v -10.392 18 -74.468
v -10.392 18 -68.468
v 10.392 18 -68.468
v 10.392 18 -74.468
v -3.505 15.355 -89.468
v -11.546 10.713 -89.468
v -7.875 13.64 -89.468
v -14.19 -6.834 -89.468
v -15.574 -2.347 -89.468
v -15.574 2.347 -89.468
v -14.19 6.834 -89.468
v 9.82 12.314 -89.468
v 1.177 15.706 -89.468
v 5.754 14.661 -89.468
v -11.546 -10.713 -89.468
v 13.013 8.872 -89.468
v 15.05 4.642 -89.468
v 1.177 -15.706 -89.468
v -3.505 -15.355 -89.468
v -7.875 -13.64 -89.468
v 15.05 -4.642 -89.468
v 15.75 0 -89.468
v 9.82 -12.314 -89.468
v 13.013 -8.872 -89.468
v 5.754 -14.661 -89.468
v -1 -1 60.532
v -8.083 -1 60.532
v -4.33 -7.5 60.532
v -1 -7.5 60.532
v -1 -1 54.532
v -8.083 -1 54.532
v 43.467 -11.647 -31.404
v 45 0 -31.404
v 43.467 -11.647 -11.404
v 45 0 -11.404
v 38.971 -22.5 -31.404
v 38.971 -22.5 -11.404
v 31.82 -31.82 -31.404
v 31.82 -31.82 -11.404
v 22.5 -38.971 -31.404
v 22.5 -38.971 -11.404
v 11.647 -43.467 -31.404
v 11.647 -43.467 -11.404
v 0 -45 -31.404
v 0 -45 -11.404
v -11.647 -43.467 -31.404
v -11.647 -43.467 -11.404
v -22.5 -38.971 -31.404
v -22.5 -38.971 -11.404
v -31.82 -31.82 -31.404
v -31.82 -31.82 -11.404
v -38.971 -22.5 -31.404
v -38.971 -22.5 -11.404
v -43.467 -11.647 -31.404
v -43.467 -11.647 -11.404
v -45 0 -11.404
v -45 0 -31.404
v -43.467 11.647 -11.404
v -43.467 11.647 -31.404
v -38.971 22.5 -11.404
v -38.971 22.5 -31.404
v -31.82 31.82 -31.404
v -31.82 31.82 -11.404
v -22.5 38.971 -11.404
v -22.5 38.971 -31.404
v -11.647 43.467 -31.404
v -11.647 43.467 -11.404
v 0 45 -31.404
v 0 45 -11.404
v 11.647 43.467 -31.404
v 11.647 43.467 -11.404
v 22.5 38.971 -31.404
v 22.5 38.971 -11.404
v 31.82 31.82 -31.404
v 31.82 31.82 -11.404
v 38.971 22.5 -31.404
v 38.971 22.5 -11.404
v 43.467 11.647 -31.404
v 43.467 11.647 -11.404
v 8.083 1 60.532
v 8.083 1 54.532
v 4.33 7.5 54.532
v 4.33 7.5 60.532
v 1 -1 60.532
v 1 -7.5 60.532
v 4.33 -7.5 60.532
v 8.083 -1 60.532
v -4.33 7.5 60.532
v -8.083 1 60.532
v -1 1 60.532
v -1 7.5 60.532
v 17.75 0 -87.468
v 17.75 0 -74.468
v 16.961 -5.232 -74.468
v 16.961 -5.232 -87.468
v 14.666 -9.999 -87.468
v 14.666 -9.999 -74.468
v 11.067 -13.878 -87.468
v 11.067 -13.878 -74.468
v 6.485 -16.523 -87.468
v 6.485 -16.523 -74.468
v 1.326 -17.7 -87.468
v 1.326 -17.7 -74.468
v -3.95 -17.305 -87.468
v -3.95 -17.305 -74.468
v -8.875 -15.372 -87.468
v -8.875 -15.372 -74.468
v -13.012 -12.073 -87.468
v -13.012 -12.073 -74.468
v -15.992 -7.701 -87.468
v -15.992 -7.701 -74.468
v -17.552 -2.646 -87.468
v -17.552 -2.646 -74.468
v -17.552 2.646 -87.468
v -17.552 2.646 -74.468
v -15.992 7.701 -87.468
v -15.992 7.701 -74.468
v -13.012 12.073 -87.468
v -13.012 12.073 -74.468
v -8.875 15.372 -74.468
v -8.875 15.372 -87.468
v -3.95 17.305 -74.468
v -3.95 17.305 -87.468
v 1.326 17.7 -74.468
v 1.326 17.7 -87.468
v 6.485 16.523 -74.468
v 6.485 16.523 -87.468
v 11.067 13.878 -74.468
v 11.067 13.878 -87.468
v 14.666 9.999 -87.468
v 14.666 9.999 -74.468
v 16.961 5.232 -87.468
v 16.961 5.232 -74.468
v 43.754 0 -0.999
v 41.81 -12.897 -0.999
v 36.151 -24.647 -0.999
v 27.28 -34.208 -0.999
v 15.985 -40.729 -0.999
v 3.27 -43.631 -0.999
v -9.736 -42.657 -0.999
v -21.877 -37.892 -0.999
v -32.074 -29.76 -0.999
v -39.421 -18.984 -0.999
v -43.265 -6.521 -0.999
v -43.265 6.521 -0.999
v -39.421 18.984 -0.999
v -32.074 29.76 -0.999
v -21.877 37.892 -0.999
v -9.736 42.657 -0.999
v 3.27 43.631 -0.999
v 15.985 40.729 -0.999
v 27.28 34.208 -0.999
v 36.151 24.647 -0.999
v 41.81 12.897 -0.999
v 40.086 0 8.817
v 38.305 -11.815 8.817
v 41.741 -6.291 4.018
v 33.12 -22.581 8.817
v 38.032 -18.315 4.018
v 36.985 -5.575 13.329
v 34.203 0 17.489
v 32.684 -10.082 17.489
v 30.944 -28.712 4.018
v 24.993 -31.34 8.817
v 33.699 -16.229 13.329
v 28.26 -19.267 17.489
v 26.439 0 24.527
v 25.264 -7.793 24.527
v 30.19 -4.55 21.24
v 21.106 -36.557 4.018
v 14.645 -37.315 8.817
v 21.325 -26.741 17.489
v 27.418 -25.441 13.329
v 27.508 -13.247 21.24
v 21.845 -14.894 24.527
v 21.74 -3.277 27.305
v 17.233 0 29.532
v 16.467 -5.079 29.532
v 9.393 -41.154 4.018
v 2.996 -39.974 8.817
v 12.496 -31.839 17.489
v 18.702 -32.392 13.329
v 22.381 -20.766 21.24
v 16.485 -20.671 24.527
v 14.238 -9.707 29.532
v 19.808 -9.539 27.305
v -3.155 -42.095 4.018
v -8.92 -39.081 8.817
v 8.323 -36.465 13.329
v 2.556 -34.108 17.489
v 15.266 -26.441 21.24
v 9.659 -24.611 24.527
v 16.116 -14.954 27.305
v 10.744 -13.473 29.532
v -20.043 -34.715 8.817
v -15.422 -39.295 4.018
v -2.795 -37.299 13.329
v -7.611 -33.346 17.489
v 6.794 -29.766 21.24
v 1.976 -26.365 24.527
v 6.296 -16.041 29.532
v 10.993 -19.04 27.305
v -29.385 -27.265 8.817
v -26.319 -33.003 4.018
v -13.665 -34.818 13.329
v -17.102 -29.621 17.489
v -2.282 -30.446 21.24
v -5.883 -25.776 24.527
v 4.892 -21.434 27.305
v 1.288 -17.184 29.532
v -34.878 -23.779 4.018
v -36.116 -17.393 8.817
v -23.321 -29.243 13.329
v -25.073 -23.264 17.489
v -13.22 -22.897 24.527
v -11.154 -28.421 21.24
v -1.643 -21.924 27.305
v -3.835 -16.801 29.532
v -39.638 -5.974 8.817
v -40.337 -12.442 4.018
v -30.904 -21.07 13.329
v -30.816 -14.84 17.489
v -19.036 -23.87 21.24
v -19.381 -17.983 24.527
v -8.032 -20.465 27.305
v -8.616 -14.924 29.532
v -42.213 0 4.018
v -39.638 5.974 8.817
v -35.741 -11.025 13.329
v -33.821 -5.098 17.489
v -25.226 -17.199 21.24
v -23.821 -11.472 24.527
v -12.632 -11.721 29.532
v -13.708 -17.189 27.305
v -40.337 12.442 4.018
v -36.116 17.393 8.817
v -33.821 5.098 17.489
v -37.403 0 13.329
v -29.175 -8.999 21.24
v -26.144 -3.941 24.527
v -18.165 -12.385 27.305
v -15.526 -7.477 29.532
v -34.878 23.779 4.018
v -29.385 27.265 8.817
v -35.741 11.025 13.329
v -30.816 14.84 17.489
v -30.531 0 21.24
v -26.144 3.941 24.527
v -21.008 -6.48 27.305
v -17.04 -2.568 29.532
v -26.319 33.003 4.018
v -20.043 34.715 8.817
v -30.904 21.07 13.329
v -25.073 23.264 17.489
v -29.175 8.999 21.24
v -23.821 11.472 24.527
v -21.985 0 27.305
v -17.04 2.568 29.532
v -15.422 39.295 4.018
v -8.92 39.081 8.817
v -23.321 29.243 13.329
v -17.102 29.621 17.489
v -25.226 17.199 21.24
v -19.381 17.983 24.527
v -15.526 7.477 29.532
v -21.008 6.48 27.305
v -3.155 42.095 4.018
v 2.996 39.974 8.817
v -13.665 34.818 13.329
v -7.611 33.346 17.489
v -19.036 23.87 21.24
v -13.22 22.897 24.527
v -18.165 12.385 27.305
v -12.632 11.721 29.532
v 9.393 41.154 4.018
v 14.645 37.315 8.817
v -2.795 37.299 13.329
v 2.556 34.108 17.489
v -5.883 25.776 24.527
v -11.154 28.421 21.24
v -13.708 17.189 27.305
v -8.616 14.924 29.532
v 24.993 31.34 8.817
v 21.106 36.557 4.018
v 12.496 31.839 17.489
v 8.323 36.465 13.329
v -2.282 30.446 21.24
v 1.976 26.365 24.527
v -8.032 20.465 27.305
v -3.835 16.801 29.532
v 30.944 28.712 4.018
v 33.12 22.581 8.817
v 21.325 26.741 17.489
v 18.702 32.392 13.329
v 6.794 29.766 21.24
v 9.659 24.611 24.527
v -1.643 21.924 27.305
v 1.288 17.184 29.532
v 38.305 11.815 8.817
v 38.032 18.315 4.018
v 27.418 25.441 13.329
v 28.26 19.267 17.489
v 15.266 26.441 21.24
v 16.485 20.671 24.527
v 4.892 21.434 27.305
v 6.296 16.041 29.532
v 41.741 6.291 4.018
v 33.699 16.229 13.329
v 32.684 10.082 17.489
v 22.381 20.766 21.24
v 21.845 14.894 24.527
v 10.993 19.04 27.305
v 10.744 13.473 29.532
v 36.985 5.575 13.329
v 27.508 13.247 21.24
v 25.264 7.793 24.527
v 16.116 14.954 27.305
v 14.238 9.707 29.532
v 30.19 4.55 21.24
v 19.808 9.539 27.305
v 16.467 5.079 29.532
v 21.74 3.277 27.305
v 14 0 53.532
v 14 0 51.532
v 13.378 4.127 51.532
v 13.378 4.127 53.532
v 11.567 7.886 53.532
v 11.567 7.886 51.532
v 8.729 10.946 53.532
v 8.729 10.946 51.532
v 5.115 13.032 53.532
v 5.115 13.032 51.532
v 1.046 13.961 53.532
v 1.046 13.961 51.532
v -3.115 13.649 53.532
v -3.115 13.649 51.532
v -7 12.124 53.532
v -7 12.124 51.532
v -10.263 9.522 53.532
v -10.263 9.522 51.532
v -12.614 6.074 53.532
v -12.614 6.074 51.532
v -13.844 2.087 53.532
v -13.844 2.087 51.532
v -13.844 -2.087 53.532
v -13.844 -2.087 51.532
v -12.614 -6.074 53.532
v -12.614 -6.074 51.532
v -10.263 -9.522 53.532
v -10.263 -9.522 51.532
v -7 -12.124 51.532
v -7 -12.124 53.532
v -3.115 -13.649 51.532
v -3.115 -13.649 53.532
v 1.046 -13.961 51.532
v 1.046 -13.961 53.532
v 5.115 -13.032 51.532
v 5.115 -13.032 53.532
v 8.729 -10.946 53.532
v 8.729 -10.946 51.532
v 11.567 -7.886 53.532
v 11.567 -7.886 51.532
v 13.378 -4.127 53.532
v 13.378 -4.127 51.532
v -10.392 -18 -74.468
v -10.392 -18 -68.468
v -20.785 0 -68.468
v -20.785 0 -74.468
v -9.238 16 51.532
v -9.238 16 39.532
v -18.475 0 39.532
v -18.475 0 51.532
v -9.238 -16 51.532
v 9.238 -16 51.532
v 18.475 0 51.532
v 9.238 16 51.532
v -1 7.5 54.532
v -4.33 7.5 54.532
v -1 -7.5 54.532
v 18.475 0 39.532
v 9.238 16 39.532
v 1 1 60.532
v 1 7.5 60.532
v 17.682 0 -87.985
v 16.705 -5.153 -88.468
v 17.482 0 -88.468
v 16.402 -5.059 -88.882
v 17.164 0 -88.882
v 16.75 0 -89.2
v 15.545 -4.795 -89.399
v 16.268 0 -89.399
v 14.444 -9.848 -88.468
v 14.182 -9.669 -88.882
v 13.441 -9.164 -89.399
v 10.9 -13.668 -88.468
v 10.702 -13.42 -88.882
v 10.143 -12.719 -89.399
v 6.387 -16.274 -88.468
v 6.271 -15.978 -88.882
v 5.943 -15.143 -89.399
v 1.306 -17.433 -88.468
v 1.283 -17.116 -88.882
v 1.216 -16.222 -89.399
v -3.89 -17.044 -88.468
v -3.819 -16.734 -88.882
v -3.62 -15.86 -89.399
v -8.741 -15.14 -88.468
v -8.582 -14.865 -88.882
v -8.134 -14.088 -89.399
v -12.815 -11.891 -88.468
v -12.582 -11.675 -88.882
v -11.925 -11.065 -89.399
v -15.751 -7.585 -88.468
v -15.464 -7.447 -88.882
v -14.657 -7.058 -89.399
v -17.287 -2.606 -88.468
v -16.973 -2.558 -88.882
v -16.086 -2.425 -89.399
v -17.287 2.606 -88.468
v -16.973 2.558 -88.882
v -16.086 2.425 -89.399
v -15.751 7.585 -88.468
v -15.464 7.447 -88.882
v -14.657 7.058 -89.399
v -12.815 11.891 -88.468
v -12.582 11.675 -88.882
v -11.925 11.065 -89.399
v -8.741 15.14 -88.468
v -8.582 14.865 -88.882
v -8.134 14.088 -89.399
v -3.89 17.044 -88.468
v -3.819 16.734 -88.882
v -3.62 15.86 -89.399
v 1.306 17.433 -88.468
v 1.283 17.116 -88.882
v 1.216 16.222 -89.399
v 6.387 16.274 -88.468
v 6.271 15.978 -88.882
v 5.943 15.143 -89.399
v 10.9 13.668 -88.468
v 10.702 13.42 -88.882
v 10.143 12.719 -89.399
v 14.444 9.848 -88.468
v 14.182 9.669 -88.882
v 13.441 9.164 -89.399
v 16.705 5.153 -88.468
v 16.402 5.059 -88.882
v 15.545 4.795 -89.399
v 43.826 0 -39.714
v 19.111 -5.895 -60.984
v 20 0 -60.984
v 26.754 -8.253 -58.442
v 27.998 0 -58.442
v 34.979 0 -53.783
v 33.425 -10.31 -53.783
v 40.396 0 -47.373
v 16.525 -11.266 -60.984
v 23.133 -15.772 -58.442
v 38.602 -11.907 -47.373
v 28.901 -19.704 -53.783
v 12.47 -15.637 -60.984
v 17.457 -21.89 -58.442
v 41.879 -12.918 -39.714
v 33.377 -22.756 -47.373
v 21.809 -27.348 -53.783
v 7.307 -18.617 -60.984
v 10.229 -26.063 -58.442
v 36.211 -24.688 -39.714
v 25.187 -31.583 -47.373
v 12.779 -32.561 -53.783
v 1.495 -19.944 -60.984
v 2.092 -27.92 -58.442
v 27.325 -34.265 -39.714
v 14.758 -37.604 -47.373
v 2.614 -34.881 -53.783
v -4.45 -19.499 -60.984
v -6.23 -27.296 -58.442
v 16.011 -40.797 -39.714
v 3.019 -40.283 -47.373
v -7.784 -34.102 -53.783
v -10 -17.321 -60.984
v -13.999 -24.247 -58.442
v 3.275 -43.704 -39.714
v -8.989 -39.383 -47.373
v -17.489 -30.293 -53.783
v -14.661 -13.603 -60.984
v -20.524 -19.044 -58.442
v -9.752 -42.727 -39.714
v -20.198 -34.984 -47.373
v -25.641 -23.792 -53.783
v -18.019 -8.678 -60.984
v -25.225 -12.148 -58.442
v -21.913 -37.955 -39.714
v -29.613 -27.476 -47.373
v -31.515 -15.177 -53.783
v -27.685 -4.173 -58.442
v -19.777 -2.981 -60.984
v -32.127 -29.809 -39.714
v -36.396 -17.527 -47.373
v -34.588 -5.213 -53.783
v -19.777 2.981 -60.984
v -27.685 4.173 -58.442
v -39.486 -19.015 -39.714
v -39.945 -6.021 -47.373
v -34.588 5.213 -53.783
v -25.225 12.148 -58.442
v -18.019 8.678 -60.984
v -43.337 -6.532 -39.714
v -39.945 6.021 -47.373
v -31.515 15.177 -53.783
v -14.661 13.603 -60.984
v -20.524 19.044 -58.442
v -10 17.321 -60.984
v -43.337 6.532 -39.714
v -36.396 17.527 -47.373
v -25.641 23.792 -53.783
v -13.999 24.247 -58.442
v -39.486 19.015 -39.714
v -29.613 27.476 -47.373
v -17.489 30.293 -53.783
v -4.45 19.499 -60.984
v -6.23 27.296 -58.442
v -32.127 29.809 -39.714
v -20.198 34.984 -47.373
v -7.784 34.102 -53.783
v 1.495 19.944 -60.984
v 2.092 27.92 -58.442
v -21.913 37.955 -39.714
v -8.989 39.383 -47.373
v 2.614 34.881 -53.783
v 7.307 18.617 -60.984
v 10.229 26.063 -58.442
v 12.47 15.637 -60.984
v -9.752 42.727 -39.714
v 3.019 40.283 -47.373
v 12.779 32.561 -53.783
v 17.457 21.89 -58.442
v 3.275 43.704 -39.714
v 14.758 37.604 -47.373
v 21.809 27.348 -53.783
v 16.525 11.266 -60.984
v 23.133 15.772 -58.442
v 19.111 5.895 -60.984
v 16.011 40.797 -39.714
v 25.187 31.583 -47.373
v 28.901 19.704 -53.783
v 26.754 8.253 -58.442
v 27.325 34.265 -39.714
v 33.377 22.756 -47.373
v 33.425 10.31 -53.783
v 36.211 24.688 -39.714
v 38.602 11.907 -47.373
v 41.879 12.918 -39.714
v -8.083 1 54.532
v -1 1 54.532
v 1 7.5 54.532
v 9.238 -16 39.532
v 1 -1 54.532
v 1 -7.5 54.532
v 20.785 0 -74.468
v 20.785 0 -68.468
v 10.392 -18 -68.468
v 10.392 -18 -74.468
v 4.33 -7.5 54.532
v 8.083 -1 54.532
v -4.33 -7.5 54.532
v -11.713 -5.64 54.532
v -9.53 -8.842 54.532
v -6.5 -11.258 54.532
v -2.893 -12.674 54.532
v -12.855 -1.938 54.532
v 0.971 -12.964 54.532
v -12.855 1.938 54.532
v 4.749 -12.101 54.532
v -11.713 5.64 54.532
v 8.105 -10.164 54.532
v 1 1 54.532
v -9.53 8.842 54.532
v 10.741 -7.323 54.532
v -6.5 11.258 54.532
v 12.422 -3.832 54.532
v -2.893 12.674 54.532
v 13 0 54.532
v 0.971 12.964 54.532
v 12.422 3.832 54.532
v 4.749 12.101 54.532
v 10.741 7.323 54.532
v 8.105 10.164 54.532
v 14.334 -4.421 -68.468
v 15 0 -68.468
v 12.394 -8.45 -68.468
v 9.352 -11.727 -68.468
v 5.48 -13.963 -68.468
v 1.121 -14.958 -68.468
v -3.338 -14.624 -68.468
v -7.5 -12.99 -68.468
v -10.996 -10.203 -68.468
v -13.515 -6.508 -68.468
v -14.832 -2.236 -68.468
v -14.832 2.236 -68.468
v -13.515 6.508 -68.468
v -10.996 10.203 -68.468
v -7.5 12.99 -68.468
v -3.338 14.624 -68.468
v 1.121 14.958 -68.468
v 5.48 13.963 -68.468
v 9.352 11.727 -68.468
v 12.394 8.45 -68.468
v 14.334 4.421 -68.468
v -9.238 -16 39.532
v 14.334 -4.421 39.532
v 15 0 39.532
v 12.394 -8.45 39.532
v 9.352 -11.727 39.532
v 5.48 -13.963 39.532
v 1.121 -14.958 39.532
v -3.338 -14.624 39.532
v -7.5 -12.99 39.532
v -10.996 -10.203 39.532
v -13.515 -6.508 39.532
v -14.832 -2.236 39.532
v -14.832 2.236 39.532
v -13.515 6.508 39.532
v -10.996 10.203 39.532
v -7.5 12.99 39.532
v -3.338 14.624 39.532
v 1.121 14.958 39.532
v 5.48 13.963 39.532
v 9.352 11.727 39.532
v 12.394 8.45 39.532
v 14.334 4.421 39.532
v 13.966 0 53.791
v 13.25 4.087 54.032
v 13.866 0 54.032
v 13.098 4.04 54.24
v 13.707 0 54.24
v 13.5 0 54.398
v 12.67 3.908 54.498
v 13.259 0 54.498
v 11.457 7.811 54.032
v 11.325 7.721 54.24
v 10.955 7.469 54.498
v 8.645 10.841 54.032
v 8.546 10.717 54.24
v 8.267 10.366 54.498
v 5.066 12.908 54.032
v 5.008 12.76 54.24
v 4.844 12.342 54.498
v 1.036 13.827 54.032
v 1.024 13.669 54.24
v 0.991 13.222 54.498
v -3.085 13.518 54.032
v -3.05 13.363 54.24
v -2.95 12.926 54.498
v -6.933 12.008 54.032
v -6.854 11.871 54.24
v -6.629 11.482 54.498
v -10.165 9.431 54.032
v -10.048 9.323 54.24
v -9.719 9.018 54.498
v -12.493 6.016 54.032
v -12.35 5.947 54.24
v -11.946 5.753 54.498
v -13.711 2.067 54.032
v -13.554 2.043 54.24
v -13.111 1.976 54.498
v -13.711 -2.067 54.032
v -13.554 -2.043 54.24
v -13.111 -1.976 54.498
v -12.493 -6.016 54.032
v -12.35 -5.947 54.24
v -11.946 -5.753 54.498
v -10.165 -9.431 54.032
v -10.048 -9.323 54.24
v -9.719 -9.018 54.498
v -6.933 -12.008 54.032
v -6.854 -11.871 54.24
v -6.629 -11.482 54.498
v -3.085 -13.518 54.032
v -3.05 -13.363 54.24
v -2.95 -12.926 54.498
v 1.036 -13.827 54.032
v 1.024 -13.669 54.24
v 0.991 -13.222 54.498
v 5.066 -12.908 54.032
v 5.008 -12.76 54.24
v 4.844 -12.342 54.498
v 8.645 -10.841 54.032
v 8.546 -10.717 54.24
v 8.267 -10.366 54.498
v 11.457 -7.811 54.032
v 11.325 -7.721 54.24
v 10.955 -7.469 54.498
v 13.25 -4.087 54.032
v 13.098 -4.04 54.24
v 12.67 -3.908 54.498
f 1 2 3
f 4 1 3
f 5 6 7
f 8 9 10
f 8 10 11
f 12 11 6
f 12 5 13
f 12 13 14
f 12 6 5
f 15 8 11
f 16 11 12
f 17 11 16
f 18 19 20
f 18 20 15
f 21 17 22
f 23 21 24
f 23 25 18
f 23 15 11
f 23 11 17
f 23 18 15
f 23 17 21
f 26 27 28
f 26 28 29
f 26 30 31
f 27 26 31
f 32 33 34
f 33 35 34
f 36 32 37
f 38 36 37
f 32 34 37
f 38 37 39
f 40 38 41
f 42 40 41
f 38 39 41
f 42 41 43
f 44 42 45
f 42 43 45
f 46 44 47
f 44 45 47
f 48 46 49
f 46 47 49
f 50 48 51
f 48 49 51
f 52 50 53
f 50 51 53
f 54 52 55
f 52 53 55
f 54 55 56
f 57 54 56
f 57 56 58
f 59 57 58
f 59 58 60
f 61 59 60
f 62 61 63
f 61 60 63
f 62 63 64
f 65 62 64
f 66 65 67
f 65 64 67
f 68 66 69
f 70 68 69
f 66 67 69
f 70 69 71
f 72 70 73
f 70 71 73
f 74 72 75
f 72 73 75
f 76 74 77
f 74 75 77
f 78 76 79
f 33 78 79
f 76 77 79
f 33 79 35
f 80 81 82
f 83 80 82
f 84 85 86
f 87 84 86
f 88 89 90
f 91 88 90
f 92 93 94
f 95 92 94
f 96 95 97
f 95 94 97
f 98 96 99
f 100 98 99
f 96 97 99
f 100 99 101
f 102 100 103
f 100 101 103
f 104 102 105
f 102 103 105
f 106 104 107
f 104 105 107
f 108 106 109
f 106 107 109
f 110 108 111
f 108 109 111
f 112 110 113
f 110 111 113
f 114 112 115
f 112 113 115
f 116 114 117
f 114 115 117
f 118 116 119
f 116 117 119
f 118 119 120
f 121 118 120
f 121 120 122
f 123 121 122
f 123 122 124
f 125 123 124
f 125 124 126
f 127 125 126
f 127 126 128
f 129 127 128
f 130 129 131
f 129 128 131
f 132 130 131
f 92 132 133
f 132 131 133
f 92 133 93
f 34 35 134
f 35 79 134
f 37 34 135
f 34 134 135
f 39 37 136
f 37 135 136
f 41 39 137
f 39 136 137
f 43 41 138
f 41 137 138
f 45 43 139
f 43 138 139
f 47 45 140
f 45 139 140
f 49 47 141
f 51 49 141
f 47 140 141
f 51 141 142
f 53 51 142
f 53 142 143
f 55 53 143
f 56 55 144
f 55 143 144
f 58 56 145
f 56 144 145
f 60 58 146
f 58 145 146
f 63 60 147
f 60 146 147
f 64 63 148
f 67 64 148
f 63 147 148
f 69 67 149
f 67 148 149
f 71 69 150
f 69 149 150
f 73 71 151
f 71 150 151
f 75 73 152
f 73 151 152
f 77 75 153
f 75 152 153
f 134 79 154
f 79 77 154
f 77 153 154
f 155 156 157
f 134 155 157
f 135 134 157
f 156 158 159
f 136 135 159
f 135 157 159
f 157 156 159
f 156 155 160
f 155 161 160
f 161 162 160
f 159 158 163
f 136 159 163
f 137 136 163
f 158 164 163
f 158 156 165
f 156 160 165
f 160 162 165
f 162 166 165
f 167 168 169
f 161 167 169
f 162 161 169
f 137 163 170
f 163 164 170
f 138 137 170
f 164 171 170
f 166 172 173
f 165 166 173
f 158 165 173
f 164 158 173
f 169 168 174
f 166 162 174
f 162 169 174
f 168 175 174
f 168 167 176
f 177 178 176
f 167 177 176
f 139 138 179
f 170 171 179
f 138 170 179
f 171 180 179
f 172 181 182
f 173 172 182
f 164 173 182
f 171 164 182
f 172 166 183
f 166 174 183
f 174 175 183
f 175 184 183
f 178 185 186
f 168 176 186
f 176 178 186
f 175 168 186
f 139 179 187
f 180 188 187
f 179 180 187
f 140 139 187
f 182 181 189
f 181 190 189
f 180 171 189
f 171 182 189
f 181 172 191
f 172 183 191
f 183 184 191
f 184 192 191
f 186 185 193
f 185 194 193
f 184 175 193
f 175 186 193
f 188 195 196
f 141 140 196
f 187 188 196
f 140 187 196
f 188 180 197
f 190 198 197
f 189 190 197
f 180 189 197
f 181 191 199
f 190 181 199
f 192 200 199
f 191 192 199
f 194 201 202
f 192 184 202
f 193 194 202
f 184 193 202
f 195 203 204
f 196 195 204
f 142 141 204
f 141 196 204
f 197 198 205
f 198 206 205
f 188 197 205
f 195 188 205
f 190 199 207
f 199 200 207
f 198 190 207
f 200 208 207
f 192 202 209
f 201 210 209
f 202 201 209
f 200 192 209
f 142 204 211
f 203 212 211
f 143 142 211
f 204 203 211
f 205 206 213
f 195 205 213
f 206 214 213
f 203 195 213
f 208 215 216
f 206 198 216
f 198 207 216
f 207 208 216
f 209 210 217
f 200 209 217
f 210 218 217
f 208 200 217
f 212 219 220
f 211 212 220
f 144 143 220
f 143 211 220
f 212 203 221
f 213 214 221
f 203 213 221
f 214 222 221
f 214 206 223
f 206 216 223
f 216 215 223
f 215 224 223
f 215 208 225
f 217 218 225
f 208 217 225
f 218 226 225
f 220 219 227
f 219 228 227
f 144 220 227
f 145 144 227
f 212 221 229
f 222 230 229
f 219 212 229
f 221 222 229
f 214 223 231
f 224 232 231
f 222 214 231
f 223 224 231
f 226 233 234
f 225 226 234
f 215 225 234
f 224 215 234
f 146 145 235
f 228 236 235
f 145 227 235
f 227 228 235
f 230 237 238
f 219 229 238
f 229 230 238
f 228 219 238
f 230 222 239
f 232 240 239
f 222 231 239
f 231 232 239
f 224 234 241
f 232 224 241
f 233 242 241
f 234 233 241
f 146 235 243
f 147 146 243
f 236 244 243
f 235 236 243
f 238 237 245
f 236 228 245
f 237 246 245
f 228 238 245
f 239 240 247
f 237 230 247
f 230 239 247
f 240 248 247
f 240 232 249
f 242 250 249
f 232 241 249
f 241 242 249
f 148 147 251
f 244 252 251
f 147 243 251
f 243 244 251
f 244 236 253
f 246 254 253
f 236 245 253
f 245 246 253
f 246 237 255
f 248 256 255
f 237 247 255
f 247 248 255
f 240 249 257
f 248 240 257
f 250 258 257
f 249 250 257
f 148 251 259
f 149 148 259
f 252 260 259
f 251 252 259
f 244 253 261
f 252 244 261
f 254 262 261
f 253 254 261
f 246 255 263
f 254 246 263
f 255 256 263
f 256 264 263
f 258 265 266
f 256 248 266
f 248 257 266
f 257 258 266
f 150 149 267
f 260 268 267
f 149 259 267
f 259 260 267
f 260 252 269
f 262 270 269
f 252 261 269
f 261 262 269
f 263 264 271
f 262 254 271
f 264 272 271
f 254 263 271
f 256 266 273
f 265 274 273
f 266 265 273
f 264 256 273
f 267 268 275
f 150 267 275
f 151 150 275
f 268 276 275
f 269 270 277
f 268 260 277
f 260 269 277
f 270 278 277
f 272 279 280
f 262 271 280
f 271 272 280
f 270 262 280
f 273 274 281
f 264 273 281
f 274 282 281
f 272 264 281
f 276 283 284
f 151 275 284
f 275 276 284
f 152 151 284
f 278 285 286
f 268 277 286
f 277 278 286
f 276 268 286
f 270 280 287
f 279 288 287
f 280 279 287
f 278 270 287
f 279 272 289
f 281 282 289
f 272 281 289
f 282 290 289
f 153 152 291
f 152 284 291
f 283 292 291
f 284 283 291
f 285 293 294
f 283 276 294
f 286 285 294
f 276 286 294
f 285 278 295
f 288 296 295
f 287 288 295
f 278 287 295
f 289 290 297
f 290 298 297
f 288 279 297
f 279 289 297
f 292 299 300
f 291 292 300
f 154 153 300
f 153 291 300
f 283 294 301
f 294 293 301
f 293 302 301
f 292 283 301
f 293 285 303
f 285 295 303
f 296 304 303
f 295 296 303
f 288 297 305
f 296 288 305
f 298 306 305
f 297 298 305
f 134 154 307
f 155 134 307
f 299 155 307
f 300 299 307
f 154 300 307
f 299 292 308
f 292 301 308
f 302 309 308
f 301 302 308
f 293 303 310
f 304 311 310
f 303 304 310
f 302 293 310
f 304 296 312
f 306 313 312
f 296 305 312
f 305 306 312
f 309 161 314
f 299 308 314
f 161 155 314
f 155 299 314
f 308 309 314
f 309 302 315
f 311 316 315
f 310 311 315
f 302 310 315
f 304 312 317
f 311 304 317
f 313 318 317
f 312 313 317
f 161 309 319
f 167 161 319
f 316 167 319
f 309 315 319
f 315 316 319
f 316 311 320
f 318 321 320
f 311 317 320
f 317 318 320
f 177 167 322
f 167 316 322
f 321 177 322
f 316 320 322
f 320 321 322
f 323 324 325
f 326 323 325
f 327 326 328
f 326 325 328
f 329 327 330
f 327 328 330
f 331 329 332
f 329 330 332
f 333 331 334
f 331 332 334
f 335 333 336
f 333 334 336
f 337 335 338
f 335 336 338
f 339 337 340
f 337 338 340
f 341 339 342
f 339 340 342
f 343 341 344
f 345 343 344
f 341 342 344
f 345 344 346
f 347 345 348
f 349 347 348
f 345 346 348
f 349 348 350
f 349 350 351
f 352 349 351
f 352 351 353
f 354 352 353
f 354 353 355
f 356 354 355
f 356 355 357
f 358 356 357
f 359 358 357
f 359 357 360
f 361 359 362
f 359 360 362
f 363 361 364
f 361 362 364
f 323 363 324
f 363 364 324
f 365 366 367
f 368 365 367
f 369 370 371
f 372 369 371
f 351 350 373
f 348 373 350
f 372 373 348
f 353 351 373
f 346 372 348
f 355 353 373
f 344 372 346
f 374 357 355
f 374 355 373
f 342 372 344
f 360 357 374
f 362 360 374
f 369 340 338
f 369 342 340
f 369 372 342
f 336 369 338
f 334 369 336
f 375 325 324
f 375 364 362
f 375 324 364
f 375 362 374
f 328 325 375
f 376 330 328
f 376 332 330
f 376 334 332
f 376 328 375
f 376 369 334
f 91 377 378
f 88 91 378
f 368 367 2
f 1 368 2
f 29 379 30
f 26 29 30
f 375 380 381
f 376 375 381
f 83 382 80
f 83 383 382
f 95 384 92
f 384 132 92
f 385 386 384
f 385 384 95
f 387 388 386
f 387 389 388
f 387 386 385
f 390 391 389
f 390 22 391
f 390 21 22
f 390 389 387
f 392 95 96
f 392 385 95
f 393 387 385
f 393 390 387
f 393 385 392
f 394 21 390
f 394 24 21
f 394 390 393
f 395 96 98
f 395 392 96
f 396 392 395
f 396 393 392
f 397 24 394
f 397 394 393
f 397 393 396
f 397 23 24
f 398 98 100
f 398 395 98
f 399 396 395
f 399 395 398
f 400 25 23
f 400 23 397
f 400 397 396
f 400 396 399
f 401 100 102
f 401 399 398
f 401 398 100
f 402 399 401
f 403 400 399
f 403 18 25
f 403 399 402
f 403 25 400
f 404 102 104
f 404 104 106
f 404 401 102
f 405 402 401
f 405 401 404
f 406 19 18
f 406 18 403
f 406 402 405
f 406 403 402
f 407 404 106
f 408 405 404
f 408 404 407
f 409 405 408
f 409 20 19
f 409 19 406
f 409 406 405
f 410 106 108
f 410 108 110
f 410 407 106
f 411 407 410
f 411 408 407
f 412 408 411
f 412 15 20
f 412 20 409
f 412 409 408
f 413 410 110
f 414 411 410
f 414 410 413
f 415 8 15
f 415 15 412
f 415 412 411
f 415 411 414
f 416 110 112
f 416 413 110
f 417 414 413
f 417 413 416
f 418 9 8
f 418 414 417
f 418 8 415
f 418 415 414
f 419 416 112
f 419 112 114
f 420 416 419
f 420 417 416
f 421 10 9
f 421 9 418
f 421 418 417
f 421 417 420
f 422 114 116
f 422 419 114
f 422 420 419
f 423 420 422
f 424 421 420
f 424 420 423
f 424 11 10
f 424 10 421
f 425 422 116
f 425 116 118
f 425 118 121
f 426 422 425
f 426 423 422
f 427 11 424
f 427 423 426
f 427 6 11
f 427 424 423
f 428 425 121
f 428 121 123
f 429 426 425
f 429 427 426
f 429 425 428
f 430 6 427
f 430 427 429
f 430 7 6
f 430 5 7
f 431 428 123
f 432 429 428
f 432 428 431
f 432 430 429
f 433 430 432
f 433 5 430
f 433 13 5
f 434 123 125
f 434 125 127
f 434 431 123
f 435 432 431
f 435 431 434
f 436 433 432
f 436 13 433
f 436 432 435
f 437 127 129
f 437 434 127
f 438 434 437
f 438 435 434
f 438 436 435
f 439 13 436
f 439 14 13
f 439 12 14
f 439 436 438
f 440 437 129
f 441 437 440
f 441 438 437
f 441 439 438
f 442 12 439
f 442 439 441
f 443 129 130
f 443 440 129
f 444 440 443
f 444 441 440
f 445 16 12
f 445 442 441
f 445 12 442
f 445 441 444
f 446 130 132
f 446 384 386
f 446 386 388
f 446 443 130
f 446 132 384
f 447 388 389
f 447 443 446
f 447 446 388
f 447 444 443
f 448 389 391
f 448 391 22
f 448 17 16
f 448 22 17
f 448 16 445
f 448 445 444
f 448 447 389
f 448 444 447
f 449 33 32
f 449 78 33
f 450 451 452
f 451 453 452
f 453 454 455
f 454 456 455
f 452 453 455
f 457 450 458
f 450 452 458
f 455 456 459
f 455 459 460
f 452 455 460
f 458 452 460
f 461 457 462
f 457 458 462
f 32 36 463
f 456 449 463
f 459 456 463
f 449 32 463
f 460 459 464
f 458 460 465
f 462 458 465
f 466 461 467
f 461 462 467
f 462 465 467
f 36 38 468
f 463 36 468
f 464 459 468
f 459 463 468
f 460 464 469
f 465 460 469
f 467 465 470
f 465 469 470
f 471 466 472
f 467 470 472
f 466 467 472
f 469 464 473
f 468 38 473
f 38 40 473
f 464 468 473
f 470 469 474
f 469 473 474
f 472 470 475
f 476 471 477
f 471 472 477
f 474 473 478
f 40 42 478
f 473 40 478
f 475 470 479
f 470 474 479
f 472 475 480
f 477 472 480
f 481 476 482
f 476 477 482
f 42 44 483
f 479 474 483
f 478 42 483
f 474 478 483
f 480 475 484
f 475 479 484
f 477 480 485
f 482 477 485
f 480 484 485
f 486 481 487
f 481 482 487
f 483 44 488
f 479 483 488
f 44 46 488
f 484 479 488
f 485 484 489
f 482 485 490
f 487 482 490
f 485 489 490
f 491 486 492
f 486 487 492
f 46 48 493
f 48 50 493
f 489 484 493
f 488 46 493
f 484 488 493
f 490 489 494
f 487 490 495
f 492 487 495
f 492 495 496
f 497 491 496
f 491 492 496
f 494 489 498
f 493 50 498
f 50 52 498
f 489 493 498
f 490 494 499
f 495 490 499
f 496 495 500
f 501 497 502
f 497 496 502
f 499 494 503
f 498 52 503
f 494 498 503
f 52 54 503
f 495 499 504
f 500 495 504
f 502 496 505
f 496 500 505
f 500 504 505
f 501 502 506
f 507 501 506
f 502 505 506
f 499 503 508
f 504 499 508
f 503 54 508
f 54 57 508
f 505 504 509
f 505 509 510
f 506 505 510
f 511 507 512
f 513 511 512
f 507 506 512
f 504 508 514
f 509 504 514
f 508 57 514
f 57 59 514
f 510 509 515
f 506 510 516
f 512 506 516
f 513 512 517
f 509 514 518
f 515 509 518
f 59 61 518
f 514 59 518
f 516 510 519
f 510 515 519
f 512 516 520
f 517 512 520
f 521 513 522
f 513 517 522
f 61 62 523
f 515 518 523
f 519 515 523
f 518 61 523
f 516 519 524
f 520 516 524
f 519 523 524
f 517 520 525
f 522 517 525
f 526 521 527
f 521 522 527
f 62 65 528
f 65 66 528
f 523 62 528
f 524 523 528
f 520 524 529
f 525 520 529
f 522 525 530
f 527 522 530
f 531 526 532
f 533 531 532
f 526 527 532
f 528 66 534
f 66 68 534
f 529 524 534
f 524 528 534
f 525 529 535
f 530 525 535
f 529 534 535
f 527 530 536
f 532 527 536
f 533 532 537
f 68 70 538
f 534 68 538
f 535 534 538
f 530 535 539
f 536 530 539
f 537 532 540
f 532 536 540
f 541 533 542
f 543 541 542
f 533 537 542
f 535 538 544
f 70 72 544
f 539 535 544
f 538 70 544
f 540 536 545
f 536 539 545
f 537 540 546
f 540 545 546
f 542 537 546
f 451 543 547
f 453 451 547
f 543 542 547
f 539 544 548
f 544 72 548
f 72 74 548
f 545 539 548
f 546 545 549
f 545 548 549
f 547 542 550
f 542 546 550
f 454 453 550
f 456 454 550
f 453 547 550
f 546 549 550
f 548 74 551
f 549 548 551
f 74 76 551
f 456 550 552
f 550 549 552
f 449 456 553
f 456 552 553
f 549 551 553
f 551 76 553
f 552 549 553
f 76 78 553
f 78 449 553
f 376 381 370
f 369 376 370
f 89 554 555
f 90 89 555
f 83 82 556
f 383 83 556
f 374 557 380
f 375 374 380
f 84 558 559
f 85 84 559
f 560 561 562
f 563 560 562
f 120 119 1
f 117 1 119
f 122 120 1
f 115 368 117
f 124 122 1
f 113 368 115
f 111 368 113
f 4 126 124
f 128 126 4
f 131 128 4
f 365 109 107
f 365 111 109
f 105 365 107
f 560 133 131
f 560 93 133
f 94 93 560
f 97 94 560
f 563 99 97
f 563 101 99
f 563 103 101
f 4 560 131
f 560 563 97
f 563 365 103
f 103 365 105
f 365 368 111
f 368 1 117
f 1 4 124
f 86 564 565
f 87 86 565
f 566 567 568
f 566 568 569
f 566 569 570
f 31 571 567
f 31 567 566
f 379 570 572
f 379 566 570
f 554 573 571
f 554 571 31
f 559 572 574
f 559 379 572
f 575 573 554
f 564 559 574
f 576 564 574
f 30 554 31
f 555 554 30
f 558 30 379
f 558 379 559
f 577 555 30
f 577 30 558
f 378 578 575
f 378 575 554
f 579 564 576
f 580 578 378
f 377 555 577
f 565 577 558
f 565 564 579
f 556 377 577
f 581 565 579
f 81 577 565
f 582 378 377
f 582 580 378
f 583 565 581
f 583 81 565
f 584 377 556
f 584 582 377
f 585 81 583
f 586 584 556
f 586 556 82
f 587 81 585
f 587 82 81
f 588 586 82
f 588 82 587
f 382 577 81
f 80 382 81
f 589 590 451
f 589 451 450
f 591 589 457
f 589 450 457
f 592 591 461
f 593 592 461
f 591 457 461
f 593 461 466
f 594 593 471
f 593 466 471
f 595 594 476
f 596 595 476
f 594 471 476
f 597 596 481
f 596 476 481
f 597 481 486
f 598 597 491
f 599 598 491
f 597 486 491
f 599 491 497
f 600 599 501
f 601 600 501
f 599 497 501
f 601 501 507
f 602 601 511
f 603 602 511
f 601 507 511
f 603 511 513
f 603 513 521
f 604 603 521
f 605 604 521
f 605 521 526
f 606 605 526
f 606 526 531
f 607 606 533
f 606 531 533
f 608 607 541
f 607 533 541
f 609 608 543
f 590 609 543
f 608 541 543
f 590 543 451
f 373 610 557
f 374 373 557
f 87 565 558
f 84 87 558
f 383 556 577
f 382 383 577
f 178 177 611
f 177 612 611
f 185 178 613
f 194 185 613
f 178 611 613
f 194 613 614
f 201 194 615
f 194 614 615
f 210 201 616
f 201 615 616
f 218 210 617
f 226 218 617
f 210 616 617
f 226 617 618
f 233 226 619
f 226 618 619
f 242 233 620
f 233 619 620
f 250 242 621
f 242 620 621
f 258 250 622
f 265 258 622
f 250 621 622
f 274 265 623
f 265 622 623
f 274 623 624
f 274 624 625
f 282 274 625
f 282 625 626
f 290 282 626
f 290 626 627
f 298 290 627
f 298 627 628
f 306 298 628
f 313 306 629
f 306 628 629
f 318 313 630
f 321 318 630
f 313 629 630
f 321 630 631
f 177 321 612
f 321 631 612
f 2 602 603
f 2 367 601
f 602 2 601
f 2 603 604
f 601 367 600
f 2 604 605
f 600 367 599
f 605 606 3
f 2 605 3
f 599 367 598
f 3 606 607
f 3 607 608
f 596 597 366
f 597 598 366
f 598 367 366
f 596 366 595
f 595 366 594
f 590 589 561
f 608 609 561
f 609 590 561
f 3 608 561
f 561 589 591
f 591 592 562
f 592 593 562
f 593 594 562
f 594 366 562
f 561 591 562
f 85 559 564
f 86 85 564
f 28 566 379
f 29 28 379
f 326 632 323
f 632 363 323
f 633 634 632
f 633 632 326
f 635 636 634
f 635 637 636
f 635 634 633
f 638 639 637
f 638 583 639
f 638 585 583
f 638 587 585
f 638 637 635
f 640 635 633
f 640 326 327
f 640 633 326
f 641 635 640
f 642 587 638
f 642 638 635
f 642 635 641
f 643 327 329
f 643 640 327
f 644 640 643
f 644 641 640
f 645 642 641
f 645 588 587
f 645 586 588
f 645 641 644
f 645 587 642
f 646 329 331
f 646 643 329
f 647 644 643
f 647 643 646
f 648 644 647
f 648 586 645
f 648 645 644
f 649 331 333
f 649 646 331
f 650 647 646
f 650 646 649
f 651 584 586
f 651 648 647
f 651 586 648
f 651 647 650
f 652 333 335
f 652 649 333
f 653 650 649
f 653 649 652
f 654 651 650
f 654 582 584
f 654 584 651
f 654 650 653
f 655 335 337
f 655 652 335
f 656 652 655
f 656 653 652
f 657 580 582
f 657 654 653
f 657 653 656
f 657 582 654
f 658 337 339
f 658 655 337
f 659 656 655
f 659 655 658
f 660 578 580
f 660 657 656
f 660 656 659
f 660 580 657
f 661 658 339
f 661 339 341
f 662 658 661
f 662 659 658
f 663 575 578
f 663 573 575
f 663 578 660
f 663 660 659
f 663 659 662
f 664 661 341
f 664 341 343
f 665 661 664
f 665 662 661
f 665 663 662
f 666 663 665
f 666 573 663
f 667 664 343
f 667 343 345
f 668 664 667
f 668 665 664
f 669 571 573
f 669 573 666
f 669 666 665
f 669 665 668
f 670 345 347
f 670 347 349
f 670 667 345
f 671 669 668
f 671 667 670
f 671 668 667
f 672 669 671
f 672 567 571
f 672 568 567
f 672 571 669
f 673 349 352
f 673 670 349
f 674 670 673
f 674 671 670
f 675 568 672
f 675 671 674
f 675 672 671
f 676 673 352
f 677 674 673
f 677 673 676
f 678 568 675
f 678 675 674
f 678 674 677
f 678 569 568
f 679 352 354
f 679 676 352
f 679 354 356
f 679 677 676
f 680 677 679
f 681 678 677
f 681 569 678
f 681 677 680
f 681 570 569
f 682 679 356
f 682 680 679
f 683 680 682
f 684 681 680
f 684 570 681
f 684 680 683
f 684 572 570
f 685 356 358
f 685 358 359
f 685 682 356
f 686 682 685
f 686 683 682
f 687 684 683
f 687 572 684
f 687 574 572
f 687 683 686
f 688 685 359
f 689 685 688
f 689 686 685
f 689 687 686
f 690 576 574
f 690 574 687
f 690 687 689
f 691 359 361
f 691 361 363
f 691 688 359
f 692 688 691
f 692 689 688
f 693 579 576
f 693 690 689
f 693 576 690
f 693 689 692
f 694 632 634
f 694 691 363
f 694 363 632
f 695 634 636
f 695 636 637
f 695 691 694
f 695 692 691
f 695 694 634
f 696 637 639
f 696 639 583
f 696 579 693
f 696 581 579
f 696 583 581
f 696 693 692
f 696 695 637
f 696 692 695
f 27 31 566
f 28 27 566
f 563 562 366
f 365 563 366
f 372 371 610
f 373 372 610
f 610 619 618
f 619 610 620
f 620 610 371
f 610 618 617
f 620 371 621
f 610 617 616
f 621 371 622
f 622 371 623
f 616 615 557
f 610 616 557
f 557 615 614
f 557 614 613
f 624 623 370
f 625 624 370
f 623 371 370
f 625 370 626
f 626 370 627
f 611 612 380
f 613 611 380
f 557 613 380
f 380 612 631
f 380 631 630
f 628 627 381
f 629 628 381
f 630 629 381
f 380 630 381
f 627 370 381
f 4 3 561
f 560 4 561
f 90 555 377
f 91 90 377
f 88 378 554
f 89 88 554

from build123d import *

# Parameters (mm, degrees)
F2_R      = 15
F3_DEPTH  = 12
F4_R      = 14
F5_DEPTH  = 3
F6_R      = 1
F8_DEPTH  = 6
F9_R      = 15
F10_DEPTH = 6
F11_R     = 17.75
F12_DEPTH = 15
F13_R     = 2


with BuildPart() as f1:
    # F0 (on Front) → F1 (revolve)
    with BuildSketch(Plane.XZ):
        with BuildLine():
            Line((15, 39.5324291697), (0, 39.5324291697))
            Line((0, 39.5324291697), (0, -68.4675708303))
            Line((0, -68.4675708303), (15, -68.4675708303))
            Line((15, -68.4675708303), (20, -60.9842560568))
            ThreePointArc((20, -60.9842560568), (37.9128784748, -50.7687738723), (45, -31.4038571413))
            Line((45, -31.4038571413), (45, -11.4038571413))
            ThreePointArc((45, -11.4038571413), (37.4032174761, 13.3287561425), (17.2325892015, 29.5324291697))
            Line((17.2325892015, 29.5324291697), (15, 39.5324291697))
        make_face()
    revolve(axis=Axis((0, 0, -14.4675708303), (0, 0, -1)))

    # F2 (on face) → F3 (join)
    with BuildSketch(Plane.XY.offset(39.5324291697)):
        Polygon((9.237604307, -16), (18.4752086141, 0), (9.237604307, 16), (-9.237604307, 16), (-18.4752086141, 0), (-9.237604307, -16), align=None)
        Circle(F2_R, mode=Mode.SUBTRACT)
        Polygon((9.237604307, -16), (18.4752086141, 0), (9.237604307, 16), (-9.237604307, 16), (-18.4752086141, 0), (-9.237604307, -16), align=None)
    extrude(amount=F3_DEPTH)

    # F4 (on face) → F5 (join)
    with BuildSketch(Plane.XY.offset(51.5324291697)):
        Circle(F4_R)
    extrude(amount=F5_DEPTH)

    # F6
    f6_edges = [f1.edges().sort_by_distance(p)[0] for p in [
        (-14, 0, 54.532429),
    ]]
    fillet(f6_edges, radius=F6_R)

    # F7 (on face) → F8 (join)
    with BuildSketch(Plane.XY.offset(54.5324291697)):
        Polygon((4.3301270189, -7.5), (8.0829037687, -1), (1, -1), (1, -7.5), align=None)
        Polygon((-1, -7.5), (-1, -1), (-8.0829037687, -1), (-4.3301270189, -7.5), align=None)
        Polygon((1, 1), (8.0829037687, 1), (4.3301270189, 7.5), (1, 7.5), align=None)
        Polygon((-8.0829037687, 1), (-1, 1), (-1, 7.5), (-4.3301270189, 7.5), align=None)
    extrude(amount=F8_DEPTH)

    # F9 (on face) → F10 (join)
    with BuildSketch(Plane(origin=(0, 0, -68.4675708303), x_dir=(1, 0, 0), z_dir=(0, 0, -1))):
        Polygon((10.3923048454, -18), (20.7846096908, 0), (10.3923048454, 18), (-10.3923048454, 18), (-20.7846096908, 0), (-10.3923048454, -18), align=None)
        Circle(F9_R, mode=Mode.SUBTRACT)
        Polygon((10.3923048454, -18), (20.7846096908, 0), (10.3923048454, 18), (-10.3923048454, 18), (-20.7846096908, 0), (-10.3923048454, -18), align=None)
    extrude(amount=F10_DEPTH)

    # F11 (on face) → F12 (join)
    with BuildSketch(Plane(origin=(0, 0, -74.4675708303), x_dir=(1, 0, 0), z_dir=(0, 0, -1))):
        Circle(F11_R)
    extrude(amount=F12_DEPTH)

    # F13
    f13_edges = [f1.edges().sort_by_distance(p)[0] for p in [
        (-17.75, 0, -89.467571),
    ]]
    fillet(f13_edges, radius=F13_R)


solid = f1.part
